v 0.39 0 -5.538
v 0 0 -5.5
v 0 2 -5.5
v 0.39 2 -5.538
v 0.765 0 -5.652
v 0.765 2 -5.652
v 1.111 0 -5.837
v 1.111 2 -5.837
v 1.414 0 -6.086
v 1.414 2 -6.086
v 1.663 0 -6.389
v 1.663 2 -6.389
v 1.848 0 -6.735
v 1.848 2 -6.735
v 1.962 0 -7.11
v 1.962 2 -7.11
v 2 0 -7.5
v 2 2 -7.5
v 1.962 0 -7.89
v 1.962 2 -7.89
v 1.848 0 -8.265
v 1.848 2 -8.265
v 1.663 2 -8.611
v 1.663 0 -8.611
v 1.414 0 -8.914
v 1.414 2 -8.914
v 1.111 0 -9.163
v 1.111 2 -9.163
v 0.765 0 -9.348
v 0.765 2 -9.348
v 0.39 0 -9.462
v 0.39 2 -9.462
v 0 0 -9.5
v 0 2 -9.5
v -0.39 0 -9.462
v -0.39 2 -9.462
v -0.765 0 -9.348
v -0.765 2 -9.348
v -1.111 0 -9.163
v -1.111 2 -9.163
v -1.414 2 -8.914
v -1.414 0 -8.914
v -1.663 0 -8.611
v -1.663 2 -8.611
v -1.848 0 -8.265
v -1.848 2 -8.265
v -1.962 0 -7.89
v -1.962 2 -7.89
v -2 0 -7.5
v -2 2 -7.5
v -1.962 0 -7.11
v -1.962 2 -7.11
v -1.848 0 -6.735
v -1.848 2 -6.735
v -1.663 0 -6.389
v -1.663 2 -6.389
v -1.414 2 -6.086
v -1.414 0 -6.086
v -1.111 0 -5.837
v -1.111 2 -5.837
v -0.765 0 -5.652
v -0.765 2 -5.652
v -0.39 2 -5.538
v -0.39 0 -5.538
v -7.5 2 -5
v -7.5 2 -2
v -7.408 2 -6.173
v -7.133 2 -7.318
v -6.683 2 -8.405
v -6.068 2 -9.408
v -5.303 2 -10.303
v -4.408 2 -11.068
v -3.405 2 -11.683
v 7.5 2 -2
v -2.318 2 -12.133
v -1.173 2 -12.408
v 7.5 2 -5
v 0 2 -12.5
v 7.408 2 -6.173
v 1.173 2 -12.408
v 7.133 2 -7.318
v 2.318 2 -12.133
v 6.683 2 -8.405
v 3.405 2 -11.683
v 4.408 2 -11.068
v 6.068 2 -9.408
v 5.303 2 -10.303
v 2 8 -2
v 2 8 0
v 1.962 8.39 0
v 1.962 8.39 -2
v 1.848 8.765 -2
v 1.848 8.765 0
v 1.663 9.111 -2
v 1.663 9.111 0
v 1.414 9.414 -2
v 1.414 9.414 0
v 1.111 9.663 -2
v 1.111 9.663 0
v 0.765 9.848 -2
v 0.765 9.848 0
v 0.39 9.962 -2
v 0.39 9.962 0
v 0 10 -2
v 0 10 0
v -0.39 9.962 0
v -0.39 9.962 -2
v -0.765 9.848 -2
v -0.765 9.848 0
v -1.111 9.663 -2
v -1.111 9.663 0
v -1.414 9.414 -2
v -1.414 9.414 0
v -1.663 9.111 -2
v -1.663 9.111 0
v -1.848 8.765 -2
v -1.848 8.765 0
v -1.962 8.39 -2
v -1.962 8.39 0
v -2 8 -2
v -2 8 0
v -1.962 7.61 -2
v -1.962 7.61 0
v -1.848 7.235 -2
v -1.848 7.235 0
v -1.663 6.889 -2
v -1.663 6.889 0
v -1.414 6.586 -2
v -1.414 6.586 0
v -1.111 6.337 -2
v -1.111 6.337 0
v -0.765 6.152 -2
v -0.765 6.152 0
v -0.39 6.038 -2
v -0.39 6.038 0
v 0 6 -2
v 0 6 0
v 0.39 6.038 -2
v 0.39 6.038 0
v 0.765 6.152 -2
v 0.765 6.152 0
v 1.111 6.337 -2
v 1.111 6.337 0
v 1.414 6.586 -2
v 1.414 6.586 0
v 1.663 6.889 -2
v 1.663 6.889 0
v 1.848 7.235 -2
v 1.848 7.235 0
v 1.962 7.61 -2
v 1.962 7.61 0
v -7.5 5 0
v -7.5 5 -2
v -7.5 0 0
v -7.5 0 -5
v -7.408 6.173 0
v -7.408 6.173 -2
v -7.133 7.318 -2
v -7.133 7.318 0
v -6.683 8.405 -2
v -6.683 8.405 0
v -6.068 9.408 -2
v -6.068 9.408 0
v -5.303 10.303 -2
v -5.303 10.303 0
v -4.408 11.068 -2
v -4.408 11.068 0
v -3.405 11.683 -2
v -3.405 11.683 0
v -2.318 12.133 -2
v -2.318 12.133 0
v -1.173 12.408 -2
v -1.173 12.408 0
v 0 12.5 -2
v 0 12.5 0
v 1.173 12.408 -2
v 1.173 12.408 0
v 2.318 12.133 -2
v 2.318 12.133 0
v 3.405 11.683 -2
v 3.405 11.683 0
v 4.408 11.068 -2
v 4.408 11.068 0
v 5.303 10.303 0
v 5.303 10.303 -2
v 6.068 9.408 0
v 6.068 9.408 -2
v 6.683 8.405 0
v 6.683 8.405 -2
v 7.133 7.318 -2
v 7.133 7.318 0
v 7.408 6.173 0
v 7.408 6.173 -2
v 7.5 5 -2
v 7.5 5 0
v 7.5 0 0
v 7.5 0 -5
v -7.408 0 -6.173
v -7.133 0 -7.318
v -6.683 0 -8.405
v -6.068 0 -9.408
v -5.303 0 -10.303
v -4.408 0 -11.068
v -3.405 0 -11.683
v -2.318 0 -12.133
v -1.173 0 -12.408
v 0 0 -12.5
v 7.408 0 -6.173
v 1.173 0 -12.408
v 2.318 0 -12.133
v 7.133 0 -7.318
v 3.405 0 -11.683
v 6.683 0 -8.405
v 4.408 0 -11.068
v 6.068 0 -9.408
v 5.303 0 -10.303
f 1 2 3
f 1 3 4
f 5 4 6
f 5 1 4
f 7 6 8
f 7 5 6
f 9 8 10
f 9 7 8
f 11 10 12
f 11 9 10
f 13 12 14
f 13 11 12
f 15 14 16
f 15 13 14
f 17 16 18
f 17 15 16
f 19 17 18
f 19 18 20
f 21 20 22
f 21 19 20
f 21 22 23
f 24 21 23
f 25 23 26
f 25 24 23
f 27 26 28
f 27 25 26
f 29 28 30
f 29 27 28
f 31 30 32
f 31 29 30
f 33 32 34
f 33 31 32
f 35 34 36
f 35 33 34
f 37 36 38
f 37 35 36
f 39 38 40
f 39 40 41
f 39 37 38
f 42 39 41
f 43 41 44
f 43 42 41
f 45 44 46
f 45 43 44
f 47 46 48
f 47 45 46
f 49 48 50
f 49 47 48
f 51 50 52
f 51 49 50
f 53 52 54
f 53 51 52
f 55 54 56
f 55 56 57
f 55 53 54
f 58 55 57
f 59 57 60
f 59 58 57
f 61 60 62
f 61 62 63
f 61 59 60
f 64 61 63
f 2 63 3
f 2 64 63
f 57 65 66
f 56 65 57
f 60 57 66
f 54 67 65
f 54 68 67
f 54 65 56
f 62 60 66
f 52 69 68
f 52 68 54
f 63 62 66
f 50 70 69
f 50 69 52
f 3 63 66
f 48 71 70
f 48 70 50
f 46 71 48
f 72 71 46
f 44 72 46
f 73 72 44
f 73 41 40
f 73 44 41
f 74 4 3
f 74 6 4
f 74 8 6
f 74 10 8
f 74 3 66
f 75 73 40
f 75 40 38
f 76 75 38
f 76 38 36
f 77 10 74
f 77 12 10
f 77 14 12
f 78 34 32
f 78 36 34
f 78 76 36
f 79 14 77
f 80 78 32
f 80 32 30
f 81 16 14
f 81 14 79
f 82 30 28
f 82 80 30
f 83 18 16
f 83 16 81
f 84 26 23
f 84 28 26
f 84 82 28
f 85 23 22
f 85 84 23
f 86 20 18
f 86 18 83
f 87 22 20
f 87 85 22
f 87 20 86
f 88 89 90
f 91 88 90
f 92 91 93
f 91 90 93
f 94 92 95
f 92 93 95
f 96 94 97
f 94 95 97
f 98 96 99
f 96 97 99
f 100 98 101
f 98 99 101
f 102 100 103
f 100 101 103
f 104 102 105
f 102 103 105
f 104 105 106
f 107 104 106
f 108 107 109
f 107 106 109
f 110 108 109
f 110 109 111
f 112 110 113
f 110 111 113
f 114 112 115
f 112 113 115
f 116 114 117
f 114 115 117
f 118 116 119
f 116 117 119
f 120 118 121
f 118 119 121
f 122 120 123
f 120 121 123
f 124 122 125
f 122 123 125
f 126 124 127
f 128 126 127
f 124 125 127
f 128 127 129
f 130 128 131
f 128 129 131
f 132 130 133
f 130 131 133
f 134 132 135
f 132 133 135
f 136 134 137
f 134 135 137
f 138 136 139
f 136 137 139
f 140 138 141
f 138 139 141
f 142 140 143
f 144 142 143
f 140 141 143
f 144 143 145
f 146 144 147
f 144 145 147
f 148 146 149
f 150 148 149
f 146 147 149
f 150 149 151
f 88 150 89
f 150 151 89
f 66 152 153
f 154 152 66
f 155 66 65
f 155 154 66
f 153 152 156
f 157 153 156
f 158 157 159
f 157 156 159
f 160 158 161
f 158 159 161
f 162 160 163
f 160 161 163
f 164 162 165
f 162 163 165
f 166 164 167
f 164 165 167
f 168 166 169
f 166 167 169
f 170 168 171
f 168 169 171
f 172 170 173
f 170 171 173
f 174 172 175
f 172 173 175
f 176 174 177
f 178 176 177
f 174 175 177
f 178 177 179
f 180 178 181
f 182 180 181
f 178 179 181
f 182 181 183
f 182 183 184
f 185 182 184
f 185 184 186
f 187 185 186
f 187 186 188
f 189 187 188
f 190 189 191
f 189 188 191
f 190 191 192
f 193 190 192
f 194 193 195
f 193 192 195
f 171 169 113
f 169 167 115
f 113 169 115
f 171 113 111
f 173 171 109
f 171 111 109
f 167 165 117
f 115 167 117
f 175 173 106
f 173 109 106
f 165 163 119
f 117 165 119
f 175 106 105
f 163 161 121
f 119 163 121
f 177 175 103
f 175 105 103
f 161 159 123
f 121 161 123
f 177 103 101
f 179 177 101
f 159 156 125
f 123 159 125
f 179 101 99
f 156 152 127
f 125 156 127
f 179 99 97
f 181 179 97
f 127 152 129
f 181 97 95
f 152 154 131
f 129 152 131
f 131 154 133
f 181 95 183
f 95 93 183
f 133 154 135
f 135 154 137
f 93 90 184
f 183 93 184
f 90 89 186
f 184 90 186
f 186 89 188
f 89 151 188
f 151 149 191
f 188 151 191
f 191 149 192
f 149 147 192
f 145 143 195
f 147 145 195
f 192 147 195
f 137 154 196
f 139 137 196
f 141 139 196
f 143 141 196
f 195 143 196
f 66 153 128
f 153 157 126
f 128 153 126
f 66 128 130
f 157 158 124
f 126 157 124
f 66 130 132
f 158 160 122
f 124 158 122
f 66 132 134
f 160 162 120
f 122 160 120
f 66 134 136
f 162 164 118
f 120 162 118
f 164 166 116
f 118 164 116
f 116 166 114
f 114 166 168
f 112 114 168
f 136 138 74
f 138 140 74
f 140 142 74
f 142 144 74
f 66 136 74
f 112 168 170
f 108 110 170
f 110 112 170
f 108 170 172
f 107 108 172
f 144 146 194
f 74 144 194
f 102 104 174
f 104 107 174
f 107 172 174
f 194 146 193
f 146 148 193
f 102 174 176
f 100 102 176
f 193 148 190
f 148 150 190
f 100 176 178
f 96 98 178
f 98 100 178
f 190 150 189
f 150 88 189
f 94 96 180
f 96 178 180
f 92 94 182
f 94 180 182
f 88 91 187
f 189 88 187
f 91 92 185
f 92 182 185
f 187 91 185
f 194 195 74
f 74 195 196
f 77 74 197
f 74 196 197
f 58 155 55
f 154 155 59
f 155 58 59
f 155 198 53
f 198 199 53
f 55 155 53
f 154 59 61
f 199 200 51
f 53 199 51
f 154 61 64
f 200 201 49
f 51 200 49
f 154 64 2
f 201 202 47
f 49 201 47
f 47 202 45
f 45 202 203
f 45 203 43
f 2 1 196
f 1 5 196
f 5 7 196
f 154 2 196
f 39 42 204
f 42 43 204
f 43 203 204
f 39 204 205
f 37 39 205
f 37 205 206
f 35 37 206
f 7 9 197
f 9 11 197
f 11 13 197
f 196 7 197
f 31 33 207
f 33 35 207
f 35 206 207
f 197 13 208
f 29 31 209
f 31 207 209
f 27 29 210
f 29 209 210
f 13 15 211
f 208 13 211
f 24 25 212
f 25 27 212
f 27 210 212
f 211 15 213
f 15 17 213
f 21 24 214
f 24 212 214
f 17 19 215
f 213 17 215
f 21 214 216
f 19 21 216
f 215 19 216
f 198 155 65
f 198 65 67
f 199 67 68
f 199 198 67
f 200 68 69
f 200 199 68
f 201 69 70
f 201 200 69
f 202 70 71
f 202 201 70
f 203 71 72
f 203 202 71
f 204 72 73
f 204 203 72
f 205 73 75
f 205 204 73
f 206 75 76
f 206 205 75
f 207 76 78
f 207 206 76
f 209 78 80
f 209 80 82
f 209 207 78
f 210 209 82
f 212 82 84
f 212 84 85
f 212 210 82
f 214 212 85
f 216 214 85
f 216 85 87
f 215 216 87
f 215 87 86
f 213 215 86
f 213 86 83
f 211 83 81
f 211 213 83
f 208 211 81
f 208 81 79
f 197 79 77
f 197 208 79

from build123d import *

# Parameters (mm, degrees)
SKETCH_2_R      = 2
SKETCH_2_W      = 15
SKETCH_2_H      = 5
EXTRUDE_1_DEPTH = 2
SKETCH_1_W      = 15
SKETCH_1_H      = 5
SKETCH_1_R      = 2
EXTRUDE_2_DEPTH = 2


with BuildPart() as part:
    # 草图2 → 凸台-拉伸1 (new body)
    # profile 1 of 2: a face of its own
    with BuildSketch(Plane(origin=(0, 0, 0), x_dir=(1, 0, 0), z_dir=(0, 1, 0))):
        with BuildLine():
            ThreePointArc((-7.5, 5), (0, 12.5), (7.5, 5))
            Line((7.5, 5), (-7.5, 5))
        make_face()
        with Locations(Location((0, 7.5, 0), (0, 0, 270))):
            Circle(SKETCH_2_R, mode=Mode.SUBTRACT)
    # profile 2 of 2: a face of its own
    with BuildSketch(Plane(origin=(0, 0, 0), x_dir=(1, 0, 0), z_dir=(0, 1, 0))):
        with Locations((0, 2.5)):
            Rectangle(SKETCH_2_W, SKETCH_2_H)
    extrude(amount=EXTRUDE_1_DEPTH)

    # 草图1 → 凸台-拉伸2 (add)
    # profile 1 of 2: a face of its own
    with BuildSketch(Plane.XY):
        with Locations((0, 2.5)):
            Rectangle(SKETCH_1_W, SKETCH_1_H)
    # profile 2 of 2: a face of its own
    with BuildSketch(Plane.XY):
        with BuildLine():
            ThreePointArc((-7.5, 5), (0, 12.5), (7.5, 5))
            Line((7.5, 5), (-7.5, 5))
        make_face()
        with Locations((0, 8)):
            Circle(SKETCH_1_R, mode=Mode.SUBTRACT)
    extrude(amount=-EXTRUDE_2_DEPTH)


solid = part.part
